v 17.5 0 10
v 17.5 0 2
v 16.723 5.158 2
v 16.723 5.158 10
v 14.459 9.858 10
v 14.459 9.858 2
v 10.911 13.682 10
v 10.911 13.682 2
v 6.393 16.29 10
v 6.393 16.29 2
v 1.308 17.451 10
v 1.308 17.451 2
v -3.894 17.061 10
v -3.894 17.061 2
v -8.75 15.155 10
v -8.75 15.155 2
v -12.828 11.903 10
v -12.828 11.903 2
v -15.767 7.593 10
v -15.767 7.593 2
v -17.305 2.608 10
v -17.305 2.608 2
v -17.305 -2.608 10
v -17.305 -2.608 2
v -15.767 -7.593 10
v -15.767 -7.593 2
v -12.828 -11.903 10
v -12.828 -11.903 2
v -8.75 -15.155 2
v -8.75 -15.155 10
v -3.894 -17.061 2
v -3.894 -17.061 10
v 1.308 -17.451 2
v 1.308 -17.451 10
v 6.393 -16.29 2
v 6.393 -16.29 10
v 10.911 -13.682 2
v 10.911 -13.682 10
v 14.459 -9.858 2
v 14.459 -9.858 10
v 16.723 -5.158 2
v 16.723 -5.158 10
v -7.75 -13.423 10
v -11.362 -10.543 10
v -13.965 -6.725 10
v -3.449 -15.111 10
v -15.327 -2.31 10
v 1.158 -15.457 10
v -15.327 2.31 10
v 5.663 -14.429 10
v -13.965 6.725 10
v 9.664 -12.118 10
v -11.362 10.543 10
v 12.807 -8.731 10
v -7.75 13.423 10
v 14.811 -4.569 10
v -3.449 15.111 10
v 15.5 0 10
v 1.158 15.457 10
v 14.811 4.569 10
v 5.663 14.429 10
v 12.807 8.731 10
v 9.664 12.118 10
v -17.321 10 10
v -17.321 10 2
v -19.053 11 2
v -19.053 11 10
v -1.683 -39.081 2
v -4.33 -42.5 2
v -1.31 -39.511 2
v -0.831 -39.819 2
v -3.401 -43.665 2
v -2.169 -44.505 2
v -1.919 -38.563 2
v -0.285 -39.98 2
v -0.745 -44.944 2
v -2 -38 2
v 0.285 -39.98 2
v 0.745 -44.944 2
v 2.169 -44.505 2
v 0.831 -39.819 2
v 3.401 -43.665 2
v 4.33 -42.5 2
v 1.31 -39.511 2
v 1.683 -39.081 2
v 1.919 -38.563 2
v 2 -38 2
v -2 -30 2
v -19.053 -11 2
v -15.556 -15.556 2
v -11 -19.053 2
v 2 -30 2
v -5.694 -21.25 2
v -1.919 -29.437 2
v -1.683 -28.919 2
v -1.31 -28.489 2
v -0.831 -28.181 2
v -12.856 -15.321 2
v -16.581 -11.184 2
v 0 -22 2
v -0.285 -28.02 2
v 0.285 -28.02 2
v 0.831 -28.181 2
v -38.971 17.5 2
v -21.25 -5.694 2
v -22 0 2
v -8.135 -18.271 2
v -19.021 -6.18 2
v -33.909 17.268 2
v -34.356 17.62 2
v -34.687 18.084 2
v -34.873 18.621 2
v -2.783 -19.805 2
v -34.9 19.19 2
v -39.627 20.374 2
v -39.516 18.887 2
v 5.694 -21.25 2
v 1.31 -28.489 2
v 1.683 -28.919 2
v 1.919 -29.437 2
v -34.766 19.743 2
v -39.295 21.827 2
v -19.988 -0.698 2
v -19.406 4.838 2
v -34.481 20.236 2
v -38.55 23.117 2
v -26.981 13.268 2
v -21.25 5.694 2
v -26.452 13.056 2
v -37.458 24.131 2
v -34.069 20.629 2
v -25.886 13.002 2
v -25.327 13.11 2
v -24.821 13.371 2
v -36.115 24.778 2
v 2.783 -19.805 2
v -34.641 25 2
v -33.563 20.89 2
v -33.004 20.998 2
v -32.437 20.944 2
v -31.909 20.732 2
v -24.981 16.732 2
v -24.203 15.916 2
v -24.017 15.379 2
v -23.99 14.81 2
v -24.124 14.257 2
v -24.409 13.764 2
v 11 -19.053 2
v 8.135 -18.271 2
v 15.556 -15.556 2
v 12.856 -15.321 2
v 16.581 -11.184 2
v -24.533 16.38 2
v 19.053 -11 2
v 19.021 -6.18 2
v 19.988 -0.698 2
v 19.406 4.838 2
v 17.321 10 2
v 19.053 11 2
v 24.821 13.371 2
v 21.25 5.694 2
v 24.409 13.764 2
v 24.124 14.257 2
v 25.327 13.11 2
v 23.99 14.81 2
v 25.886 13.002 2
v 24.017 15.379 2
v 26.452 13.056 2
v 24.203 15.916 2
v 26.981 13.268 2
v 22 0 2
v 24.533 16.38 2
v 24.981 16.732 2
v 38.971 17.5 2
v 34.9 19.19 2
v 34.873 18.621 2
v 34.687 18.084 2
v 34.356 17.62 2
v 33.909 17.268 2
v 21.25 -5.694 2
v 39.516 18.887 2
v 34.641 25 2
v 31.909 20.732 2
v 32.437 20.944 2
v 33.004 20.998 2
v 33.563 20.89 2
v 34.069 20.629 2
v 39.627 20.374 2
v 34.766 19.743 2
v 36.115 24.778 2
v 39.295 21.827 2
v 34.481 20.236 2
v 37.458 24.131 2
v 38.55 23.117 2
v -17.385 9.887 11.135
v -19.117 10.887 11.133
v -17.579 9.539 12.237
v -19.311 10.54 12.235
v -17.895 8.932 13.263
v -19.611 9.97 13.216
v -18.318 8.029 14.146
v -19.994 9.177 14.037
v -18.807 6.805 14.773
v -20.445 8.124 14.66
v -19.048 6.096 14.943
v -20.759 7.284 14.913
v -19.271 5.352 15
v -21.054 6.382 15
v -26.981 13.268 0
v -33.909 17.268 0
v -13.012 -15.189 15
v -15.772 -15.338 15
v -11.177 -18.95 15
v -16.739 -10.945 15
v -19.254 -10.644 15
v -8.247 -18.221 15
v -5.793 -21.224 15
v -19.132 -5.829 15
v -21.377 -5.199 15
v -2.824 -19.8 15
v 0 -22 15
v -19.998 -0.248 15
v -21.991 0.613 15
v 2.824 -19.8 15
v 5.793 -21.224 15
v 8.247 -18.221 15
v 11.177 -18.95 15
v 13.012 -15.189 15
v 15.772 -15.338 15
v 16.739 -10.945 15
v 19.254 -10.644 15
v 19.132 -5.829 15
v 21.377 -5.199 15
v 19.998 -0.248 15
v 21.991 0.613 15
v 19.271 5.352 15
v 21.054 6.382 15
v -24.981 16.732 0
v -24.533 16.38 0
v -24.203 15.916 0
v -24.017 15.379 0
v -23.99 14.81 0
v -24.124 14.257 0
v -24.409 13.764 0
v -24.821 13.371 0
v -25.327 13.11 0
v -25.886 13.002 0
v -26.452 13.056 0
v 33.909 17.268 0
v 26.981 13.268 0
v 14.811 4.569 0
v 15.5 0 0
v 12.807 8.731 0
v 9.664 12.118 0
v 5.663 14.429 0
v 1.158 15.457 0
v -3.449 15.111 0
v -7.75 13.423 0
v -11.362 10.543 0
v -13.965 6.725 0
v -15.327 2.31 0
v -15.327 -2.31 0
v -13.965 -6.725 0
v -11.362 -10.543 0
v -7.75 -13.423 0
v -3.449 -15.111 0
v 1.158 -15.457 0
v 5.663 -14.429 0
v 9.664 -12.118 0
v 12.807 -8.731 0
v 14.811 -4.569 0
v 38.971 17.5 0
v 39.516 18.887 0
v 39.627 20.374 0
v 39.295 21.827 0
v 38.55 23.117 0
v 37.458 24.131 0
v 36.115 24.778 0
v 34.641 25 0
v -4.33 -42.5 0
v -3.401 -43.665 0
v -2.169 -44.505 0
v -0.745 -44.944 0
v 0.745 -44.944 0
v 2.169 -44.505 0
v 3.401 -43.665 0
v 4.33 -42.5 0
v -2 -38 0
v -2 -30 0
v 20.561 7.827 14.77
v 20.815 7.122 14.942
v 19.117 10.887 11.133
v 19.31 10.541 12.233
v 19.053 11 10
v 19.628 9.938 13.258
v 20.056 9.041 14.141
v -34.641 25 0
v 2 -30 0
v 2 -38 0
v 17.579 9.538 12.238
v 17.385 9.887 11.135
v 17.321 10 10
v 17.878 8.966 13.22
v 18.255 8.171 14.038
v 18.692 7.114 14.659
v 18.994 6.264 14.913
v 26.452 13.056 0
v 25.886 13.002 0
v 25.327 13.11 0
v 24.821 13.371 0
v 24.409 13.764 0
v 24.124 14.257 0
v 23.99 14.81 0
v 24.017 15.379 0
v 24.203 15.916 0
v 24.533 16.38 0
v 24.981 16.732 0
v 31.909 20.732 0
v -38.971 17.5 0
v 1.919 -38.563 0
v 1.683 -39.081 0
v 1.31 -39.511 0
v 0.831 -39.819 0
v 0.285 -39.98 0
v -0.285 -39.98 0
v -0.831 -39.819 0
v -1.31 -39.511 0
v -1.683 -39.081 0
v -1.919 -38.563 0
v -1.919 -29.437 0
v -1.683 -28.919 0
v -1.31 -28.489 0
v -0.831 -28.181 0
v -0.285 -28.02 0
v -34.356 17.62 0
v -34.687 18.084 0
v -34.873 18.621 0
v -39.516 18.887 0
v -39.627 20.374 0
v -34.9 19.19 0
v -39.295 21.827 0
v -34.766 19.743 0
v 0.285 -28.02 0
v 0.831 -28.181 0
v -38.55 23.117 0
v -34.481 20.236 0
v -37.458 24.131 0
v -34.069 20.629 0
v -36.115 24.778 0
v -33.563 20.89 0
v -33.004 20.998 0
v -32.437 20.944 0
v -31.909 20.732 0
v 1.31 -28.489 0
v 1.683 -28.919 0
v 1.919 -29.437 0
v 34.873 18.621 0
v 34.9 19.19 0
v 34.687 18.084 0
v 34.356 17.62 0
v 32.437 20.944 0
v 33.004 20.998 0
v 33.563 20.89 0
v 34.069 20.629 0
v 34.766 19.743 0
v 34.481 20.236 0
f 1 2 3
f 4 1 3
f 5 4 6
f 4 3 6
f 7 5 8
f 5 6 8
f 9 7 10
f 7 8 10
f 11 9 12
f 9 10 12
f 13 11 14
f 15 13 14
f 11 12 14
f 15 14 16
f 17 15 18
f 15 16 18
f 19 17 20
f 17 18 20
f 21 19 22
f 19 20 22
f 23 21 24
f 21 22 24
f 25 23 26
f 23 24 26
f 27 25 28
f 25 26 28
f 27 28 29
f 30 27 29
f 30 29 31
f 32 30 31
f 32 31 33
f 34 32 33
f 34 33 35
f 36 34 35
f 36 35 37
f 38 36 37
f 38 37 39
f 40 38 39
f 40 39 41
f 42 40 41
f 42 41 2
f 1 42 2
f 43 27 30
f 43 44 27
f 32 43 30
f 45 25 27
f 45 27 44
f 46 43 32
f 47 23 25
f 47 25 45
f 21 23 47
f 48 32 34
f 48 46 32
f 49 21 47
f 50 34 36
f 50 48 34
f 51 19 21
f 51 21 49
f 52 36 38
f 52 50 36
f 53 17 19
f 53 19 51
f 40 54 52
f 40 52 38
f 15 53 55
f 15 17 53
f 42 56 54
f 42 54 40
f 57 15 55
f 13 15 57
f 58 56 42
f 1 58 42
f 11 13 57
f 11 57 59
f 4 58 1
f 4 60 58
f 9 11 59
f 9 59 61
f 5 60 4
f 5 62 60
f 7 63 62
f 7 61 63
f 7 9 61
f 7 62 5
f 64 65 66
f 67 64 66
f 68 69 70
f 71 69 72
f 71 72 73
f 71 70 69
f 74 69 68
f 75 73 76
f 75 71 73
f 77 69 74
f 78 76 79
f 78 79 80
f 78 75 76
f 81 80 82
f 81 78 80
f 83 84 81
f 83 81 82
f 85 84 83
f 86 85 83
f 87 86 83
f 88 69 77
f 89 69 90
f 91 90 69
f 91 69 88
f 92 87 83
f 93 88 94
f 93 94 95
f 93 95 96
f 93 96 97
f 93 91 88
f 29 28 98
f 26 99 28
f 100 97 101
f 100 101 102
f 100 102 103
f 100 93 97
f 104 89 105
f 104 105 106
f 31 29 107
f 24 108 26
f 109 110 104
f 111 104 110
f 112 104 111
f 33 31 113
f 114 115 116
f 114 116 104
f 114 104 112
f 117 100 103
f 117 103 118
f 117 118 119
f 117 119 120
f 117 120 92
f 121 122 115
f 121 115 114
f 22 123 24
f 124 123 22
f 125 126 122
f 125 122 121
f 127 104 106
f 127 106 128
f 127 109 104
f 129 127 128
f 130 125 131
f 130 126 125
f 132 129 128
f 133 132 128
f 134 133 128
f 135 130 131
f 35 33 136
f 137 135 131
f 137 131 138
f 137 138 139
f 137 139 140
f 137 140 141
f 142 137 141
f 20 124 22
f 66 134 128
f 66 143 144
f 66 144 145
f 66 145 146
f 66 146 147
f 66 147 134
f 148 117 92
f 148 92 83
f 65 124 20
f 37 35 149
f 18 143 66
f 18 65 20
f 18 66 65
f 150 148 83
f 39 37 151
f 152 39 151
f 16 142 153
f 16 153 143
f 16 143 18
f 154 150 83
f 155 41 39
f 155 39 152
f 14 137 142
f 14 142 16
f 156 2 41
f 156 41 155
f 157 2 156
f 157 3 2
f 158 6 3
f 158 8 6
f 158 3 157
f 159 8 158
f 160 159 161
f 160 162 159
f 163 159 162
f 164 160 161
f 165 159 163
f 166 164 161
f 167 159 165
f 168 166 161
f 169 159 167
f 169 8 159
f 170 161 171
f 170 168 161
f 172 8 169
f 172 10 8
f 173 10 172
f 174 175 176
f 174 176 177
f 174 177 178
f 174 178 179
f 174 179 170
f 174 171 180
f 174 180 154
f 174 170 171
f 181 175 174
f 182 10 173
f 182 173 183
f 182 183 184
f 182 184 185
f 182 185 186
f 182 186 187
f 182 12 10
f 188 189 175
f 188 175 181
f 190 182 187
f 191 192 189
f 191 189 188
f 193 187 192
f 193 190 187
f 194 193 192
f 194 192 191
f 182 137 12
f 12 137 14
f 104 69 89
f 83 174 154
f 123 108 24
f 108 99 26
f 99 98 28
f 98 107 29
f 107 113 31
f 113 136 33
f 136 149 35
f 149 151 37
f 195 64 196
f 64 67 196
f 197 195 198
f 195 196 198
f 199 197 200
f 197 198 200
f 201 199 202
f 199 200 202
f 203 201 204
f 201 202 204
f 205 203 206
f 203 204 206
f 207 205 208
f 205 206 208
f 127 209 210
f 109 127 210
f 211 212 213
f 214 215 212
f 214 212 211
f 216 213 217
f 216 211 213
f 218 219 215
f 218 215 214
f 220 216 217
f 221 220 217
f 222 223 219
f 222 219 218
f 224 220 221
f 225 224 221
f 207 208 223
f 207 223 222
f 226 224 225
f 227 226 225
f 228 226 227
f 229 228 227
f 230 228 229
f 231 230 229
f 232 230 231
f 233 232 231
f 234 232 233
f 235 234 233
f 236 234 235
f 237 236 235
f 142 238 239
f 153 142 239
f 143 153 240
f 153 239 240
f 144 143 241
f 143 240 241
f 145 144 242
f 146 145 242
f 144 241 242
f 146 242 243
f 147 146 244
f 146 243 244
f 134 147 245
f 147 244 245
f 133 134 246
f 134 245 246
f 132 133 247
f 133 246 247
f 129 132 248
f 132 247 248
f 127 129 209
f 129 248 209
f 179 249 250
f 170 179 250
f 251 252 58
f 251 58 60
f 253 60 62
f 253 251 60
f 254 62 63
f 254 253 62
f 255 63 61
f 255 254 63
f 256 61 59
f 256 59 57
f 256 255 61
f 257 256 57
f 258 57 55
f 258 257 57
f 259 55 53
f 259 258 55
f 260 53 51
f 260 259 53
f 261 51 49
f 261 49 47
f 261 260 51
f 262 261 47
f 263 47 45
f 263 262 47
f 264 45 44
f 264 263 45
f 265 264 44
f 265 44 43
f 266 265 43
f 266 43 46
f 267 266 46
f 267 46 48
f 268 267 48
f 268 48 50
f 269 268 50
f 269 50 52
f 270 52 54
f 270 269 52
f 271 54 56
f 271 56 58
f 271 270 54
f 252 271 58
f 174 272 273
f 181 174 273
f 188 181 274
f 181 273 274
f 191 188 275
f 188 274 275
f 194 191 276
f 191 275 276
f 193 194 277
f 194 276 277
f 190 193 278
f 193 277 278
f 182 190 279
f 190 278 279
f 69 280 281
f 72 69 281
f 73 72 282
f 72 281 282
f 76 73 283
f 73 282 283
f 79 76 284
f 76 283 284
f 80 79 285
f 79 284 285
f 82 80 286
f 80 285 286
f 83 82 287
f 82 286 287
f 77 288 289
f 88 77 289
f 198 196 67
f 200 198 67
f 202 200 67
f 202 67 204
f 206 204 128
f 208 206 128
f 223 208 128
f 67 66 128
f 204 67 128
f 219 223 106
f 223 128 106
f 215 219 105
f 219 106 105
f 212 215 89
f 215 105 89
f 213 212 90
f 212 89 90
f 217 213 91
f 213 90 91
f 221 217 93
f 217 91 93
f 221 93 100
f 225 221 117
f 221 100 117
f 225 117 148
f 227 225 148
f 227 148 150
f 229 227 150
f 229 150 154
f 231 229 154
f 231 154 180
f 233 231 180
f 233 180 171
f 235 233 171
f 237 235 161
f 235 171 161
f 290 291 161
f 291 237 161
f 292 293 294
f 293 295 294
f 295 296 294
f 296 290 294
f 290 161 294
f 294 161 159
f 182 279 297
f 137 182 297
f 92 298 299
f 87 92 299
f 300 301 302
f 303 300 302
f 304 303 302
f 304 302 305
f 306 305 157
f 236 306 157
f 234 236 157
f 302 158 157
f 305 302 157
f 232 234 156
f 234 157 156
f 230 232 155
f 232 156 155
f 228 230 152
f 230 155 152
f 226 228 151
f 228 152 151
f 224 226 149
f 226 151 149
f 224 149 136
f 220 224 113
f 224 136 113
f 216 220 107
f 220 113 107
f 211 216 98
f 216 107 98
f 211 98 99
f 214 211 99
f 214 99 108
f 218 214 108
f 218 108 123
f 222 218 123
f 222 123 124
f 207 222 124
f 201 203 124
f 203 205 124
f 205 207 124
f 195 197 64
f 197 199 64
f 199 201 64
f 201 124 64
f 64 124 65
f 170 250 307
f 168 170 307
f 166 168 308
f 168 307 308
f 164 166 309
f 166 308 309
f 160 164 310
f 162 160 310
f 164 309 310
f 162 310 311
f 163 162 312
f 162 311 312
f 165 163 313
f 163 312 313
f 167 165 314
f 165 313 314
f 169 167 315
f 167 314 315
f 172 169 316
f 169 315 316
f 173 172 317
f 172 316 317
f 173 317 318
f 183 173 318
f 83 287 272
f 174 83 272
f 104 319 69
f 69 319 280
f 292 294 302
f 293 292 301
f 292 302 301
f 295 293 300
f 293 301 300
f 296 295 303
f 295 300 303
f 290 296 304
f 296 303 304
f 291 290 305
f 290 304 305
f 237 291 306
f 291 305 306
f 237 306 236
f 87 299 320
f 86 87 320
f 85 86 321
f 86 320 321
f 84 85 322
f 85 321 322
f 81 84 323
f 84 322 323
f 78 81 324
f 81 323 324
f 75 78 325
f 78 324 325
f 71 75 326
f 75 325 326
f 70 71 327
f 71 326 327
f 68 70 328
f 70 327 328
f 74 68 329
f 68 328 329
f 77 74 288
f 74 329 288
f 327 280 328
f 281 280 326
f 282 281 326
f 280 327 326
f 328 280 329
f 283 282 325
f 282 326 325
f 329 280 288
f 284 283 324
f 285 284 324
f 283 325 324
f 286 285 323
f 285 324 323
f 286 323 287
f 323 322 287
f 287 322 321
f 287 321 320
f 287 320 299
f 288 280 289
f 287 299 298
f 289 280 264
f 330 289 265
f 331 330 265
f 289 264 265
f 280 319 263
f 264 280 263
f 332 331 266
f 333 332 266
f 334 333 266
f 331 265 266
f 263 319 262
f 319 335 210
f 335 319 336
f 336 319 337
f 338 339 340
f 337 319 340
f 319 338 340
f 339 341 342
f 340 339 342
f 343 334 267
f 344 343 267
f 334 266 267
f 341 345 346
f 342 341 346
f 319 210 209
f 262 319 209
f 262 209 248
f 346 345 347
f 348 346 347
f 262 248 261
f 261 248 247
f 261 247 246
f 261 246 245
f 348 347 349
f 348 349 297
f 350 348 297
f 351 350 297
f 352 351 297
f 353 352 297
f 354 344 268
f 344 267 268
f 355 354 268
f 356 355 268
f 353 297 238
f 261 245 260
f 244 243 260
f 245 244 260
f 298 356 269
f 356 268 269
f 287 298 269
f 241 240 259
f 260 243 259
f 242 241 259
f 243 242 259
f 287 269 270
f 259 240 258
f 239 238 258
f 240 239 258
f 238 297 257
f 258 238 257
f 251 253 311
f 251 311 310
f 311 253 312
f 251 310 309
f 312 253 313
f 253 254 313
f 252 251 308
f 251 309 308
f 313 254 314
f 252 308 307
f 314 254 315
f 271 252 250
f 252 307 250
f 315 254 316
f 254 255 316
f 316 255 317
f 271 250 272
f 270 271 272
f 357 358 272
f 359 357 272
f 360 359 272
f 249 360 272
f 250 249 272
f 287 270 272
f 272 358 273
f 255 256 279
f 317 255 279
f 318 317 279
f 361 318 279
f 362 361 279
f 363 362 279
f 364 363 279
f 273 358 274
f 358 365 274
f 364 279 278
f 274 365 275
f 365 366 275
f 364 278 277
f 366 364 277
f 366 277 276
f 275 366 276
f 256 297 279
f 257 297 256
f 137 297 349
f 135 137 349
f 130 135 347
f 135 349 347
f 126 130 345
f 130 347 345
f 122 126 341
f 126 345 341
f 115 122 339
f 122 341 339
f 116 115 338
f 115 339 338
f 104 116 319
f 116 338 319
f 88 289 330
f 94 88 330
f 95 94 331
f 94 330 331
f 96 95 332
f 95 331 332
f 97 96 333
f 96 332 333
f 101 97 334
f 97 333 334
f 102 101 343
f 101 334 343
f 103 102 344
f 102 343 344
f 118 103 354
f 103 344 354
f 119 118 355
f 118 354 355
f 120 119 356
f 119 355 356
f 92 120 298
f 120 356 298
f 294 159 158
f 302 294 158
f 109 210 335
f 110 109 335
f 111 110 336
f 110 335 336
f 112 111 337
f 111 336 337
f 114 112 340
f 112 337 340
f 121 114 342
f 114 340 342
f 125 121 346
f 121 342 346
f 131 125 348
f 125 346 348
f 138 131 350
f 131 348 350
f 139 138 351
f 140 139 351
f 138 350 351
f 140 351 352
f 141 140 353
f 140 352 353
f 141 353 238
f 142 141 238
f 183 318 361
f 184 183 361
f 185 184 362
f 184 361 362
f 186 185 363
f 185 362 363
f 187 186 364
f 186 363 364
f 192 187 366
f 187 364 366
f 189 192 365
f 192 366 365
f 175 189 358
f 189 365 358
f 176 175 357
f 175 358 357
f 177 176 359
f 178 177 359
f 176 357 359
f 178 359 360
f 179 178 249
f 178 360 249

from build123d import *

# Parameters (mm, degrees)
F0_R     = 17.5
F1_DEPTH = 2
F2_DEPTH = 15
F0_R_2   = 15.5
F3_DEPTH = 10
F4_R     = 5


with BuildPart() as f1:
    # F0 (on Top) → F1 (new body)
    with BuildSketch(Plane.XY):
        with BuildLine():
            Line((34.641016, 25), (-34.641016, 25))
            ThreePointArc((-34.641016, 25), (-38.971143, 22.5), (-38.971143, 17.5))
            Line((-38.971143, 17.5), (-4.330127, -42.5))
            ThreePointArc((-4.330127, -42.5), (0, -45), (4.330127, -42.5))
            Line((4.330127, -42.5), (38.971143, 17.5))
            ThreePointArc((38.971143, 17.5), (38.971143, 22.5), (34.641016, 25))
        make_face()
        with BuildLine():
            ThreePointArc((2, -38), (0, -40), (-2, -38))
            Line((-2, -38), (-2, -30))
            ThreePointArc((-2, -30), (0, -28), (2, -30))
            Line((2, -30), (2, -38))
        make_face(mode=Mode.SUBTRACT)
        with BuildLine():
            ThreePointArc((-33.908965, 17.267949), (-34.641016, 20), (-31.908965, 20.732051))
            Line((-31.908965, 20.732051), (-24.980762, 16.732051))
            ThreePointArc((-24.980762, 16.732051), (-24.248711, 14), (-26.980762, 13.267949))
            Line((-26.980762, 13.267949), (-33.908965, 17.267949))
        make_face(mode=Mode.SUBTRACT)
        with BuildLine():
            Line((-19.052559, 11), (-17.320508, 10))
            ThreePointArc((-17.320508, 10), (0, -20), (17.320508, 10))
            Line((17.320508, 10), (19.052559, 11))
            ThreePointArc((19.052559, 11), (0, -22), (-19.052559, 11))
        make_face(mode=Mode.SUBTRACT)
        Circle(F0_R, mode=Mode.SUBTRACT)
        with BuildLine():
            ThreePointArc((31.908965, 20.732051), (34.641016, 20), (33.908965, 17.267949))
            Line((33.908965, 17.267949), (26.980762, 13.267949))
            ThreePointArc((26.980762, 13.267949), (24.248711, 14), (24.980762, 16.732051))
            Line((24.980762, 16.732051), (31.908965, 20.732051))
        make_face(mode=Mode.SUBTRACT)
    extrude(amount=F1_DEPTH)

    # F0 (on Top) → F2 (join)
    with BuildSketch(Plane.XY):
        with BuildLine():
            ThreePointArc((17.320508, 10), (0, -20), (-17.320508, 10))
            Line((-17.320508, 10), (-19.052559, 11))
            ThreePointArc((-19.052559, 11), (0, -22), (19.052559, 11))
            Line((19.052559, 11), (17.320508, 10))
        make_face()
    extrude(amount=F2_DEPTH)

    # F0 (on Top) → F3 (join)
    with BuildSketch(Plane.XY):
        Circle(F0_R)
        Circle(F0_R_2, mode=Mode.SUBTRACT)
    extrude(amount=F3_DEPTH)

    # F4
    f4_edges = [f1.edges().sort_by_distance(p)[0] for p in [
        (-18.186533, 10.5, 15),
        (18.186533, 10.5, 15),
    ]]
    fillet(f4_edges, radius=F4_R)


solid = f1.part
